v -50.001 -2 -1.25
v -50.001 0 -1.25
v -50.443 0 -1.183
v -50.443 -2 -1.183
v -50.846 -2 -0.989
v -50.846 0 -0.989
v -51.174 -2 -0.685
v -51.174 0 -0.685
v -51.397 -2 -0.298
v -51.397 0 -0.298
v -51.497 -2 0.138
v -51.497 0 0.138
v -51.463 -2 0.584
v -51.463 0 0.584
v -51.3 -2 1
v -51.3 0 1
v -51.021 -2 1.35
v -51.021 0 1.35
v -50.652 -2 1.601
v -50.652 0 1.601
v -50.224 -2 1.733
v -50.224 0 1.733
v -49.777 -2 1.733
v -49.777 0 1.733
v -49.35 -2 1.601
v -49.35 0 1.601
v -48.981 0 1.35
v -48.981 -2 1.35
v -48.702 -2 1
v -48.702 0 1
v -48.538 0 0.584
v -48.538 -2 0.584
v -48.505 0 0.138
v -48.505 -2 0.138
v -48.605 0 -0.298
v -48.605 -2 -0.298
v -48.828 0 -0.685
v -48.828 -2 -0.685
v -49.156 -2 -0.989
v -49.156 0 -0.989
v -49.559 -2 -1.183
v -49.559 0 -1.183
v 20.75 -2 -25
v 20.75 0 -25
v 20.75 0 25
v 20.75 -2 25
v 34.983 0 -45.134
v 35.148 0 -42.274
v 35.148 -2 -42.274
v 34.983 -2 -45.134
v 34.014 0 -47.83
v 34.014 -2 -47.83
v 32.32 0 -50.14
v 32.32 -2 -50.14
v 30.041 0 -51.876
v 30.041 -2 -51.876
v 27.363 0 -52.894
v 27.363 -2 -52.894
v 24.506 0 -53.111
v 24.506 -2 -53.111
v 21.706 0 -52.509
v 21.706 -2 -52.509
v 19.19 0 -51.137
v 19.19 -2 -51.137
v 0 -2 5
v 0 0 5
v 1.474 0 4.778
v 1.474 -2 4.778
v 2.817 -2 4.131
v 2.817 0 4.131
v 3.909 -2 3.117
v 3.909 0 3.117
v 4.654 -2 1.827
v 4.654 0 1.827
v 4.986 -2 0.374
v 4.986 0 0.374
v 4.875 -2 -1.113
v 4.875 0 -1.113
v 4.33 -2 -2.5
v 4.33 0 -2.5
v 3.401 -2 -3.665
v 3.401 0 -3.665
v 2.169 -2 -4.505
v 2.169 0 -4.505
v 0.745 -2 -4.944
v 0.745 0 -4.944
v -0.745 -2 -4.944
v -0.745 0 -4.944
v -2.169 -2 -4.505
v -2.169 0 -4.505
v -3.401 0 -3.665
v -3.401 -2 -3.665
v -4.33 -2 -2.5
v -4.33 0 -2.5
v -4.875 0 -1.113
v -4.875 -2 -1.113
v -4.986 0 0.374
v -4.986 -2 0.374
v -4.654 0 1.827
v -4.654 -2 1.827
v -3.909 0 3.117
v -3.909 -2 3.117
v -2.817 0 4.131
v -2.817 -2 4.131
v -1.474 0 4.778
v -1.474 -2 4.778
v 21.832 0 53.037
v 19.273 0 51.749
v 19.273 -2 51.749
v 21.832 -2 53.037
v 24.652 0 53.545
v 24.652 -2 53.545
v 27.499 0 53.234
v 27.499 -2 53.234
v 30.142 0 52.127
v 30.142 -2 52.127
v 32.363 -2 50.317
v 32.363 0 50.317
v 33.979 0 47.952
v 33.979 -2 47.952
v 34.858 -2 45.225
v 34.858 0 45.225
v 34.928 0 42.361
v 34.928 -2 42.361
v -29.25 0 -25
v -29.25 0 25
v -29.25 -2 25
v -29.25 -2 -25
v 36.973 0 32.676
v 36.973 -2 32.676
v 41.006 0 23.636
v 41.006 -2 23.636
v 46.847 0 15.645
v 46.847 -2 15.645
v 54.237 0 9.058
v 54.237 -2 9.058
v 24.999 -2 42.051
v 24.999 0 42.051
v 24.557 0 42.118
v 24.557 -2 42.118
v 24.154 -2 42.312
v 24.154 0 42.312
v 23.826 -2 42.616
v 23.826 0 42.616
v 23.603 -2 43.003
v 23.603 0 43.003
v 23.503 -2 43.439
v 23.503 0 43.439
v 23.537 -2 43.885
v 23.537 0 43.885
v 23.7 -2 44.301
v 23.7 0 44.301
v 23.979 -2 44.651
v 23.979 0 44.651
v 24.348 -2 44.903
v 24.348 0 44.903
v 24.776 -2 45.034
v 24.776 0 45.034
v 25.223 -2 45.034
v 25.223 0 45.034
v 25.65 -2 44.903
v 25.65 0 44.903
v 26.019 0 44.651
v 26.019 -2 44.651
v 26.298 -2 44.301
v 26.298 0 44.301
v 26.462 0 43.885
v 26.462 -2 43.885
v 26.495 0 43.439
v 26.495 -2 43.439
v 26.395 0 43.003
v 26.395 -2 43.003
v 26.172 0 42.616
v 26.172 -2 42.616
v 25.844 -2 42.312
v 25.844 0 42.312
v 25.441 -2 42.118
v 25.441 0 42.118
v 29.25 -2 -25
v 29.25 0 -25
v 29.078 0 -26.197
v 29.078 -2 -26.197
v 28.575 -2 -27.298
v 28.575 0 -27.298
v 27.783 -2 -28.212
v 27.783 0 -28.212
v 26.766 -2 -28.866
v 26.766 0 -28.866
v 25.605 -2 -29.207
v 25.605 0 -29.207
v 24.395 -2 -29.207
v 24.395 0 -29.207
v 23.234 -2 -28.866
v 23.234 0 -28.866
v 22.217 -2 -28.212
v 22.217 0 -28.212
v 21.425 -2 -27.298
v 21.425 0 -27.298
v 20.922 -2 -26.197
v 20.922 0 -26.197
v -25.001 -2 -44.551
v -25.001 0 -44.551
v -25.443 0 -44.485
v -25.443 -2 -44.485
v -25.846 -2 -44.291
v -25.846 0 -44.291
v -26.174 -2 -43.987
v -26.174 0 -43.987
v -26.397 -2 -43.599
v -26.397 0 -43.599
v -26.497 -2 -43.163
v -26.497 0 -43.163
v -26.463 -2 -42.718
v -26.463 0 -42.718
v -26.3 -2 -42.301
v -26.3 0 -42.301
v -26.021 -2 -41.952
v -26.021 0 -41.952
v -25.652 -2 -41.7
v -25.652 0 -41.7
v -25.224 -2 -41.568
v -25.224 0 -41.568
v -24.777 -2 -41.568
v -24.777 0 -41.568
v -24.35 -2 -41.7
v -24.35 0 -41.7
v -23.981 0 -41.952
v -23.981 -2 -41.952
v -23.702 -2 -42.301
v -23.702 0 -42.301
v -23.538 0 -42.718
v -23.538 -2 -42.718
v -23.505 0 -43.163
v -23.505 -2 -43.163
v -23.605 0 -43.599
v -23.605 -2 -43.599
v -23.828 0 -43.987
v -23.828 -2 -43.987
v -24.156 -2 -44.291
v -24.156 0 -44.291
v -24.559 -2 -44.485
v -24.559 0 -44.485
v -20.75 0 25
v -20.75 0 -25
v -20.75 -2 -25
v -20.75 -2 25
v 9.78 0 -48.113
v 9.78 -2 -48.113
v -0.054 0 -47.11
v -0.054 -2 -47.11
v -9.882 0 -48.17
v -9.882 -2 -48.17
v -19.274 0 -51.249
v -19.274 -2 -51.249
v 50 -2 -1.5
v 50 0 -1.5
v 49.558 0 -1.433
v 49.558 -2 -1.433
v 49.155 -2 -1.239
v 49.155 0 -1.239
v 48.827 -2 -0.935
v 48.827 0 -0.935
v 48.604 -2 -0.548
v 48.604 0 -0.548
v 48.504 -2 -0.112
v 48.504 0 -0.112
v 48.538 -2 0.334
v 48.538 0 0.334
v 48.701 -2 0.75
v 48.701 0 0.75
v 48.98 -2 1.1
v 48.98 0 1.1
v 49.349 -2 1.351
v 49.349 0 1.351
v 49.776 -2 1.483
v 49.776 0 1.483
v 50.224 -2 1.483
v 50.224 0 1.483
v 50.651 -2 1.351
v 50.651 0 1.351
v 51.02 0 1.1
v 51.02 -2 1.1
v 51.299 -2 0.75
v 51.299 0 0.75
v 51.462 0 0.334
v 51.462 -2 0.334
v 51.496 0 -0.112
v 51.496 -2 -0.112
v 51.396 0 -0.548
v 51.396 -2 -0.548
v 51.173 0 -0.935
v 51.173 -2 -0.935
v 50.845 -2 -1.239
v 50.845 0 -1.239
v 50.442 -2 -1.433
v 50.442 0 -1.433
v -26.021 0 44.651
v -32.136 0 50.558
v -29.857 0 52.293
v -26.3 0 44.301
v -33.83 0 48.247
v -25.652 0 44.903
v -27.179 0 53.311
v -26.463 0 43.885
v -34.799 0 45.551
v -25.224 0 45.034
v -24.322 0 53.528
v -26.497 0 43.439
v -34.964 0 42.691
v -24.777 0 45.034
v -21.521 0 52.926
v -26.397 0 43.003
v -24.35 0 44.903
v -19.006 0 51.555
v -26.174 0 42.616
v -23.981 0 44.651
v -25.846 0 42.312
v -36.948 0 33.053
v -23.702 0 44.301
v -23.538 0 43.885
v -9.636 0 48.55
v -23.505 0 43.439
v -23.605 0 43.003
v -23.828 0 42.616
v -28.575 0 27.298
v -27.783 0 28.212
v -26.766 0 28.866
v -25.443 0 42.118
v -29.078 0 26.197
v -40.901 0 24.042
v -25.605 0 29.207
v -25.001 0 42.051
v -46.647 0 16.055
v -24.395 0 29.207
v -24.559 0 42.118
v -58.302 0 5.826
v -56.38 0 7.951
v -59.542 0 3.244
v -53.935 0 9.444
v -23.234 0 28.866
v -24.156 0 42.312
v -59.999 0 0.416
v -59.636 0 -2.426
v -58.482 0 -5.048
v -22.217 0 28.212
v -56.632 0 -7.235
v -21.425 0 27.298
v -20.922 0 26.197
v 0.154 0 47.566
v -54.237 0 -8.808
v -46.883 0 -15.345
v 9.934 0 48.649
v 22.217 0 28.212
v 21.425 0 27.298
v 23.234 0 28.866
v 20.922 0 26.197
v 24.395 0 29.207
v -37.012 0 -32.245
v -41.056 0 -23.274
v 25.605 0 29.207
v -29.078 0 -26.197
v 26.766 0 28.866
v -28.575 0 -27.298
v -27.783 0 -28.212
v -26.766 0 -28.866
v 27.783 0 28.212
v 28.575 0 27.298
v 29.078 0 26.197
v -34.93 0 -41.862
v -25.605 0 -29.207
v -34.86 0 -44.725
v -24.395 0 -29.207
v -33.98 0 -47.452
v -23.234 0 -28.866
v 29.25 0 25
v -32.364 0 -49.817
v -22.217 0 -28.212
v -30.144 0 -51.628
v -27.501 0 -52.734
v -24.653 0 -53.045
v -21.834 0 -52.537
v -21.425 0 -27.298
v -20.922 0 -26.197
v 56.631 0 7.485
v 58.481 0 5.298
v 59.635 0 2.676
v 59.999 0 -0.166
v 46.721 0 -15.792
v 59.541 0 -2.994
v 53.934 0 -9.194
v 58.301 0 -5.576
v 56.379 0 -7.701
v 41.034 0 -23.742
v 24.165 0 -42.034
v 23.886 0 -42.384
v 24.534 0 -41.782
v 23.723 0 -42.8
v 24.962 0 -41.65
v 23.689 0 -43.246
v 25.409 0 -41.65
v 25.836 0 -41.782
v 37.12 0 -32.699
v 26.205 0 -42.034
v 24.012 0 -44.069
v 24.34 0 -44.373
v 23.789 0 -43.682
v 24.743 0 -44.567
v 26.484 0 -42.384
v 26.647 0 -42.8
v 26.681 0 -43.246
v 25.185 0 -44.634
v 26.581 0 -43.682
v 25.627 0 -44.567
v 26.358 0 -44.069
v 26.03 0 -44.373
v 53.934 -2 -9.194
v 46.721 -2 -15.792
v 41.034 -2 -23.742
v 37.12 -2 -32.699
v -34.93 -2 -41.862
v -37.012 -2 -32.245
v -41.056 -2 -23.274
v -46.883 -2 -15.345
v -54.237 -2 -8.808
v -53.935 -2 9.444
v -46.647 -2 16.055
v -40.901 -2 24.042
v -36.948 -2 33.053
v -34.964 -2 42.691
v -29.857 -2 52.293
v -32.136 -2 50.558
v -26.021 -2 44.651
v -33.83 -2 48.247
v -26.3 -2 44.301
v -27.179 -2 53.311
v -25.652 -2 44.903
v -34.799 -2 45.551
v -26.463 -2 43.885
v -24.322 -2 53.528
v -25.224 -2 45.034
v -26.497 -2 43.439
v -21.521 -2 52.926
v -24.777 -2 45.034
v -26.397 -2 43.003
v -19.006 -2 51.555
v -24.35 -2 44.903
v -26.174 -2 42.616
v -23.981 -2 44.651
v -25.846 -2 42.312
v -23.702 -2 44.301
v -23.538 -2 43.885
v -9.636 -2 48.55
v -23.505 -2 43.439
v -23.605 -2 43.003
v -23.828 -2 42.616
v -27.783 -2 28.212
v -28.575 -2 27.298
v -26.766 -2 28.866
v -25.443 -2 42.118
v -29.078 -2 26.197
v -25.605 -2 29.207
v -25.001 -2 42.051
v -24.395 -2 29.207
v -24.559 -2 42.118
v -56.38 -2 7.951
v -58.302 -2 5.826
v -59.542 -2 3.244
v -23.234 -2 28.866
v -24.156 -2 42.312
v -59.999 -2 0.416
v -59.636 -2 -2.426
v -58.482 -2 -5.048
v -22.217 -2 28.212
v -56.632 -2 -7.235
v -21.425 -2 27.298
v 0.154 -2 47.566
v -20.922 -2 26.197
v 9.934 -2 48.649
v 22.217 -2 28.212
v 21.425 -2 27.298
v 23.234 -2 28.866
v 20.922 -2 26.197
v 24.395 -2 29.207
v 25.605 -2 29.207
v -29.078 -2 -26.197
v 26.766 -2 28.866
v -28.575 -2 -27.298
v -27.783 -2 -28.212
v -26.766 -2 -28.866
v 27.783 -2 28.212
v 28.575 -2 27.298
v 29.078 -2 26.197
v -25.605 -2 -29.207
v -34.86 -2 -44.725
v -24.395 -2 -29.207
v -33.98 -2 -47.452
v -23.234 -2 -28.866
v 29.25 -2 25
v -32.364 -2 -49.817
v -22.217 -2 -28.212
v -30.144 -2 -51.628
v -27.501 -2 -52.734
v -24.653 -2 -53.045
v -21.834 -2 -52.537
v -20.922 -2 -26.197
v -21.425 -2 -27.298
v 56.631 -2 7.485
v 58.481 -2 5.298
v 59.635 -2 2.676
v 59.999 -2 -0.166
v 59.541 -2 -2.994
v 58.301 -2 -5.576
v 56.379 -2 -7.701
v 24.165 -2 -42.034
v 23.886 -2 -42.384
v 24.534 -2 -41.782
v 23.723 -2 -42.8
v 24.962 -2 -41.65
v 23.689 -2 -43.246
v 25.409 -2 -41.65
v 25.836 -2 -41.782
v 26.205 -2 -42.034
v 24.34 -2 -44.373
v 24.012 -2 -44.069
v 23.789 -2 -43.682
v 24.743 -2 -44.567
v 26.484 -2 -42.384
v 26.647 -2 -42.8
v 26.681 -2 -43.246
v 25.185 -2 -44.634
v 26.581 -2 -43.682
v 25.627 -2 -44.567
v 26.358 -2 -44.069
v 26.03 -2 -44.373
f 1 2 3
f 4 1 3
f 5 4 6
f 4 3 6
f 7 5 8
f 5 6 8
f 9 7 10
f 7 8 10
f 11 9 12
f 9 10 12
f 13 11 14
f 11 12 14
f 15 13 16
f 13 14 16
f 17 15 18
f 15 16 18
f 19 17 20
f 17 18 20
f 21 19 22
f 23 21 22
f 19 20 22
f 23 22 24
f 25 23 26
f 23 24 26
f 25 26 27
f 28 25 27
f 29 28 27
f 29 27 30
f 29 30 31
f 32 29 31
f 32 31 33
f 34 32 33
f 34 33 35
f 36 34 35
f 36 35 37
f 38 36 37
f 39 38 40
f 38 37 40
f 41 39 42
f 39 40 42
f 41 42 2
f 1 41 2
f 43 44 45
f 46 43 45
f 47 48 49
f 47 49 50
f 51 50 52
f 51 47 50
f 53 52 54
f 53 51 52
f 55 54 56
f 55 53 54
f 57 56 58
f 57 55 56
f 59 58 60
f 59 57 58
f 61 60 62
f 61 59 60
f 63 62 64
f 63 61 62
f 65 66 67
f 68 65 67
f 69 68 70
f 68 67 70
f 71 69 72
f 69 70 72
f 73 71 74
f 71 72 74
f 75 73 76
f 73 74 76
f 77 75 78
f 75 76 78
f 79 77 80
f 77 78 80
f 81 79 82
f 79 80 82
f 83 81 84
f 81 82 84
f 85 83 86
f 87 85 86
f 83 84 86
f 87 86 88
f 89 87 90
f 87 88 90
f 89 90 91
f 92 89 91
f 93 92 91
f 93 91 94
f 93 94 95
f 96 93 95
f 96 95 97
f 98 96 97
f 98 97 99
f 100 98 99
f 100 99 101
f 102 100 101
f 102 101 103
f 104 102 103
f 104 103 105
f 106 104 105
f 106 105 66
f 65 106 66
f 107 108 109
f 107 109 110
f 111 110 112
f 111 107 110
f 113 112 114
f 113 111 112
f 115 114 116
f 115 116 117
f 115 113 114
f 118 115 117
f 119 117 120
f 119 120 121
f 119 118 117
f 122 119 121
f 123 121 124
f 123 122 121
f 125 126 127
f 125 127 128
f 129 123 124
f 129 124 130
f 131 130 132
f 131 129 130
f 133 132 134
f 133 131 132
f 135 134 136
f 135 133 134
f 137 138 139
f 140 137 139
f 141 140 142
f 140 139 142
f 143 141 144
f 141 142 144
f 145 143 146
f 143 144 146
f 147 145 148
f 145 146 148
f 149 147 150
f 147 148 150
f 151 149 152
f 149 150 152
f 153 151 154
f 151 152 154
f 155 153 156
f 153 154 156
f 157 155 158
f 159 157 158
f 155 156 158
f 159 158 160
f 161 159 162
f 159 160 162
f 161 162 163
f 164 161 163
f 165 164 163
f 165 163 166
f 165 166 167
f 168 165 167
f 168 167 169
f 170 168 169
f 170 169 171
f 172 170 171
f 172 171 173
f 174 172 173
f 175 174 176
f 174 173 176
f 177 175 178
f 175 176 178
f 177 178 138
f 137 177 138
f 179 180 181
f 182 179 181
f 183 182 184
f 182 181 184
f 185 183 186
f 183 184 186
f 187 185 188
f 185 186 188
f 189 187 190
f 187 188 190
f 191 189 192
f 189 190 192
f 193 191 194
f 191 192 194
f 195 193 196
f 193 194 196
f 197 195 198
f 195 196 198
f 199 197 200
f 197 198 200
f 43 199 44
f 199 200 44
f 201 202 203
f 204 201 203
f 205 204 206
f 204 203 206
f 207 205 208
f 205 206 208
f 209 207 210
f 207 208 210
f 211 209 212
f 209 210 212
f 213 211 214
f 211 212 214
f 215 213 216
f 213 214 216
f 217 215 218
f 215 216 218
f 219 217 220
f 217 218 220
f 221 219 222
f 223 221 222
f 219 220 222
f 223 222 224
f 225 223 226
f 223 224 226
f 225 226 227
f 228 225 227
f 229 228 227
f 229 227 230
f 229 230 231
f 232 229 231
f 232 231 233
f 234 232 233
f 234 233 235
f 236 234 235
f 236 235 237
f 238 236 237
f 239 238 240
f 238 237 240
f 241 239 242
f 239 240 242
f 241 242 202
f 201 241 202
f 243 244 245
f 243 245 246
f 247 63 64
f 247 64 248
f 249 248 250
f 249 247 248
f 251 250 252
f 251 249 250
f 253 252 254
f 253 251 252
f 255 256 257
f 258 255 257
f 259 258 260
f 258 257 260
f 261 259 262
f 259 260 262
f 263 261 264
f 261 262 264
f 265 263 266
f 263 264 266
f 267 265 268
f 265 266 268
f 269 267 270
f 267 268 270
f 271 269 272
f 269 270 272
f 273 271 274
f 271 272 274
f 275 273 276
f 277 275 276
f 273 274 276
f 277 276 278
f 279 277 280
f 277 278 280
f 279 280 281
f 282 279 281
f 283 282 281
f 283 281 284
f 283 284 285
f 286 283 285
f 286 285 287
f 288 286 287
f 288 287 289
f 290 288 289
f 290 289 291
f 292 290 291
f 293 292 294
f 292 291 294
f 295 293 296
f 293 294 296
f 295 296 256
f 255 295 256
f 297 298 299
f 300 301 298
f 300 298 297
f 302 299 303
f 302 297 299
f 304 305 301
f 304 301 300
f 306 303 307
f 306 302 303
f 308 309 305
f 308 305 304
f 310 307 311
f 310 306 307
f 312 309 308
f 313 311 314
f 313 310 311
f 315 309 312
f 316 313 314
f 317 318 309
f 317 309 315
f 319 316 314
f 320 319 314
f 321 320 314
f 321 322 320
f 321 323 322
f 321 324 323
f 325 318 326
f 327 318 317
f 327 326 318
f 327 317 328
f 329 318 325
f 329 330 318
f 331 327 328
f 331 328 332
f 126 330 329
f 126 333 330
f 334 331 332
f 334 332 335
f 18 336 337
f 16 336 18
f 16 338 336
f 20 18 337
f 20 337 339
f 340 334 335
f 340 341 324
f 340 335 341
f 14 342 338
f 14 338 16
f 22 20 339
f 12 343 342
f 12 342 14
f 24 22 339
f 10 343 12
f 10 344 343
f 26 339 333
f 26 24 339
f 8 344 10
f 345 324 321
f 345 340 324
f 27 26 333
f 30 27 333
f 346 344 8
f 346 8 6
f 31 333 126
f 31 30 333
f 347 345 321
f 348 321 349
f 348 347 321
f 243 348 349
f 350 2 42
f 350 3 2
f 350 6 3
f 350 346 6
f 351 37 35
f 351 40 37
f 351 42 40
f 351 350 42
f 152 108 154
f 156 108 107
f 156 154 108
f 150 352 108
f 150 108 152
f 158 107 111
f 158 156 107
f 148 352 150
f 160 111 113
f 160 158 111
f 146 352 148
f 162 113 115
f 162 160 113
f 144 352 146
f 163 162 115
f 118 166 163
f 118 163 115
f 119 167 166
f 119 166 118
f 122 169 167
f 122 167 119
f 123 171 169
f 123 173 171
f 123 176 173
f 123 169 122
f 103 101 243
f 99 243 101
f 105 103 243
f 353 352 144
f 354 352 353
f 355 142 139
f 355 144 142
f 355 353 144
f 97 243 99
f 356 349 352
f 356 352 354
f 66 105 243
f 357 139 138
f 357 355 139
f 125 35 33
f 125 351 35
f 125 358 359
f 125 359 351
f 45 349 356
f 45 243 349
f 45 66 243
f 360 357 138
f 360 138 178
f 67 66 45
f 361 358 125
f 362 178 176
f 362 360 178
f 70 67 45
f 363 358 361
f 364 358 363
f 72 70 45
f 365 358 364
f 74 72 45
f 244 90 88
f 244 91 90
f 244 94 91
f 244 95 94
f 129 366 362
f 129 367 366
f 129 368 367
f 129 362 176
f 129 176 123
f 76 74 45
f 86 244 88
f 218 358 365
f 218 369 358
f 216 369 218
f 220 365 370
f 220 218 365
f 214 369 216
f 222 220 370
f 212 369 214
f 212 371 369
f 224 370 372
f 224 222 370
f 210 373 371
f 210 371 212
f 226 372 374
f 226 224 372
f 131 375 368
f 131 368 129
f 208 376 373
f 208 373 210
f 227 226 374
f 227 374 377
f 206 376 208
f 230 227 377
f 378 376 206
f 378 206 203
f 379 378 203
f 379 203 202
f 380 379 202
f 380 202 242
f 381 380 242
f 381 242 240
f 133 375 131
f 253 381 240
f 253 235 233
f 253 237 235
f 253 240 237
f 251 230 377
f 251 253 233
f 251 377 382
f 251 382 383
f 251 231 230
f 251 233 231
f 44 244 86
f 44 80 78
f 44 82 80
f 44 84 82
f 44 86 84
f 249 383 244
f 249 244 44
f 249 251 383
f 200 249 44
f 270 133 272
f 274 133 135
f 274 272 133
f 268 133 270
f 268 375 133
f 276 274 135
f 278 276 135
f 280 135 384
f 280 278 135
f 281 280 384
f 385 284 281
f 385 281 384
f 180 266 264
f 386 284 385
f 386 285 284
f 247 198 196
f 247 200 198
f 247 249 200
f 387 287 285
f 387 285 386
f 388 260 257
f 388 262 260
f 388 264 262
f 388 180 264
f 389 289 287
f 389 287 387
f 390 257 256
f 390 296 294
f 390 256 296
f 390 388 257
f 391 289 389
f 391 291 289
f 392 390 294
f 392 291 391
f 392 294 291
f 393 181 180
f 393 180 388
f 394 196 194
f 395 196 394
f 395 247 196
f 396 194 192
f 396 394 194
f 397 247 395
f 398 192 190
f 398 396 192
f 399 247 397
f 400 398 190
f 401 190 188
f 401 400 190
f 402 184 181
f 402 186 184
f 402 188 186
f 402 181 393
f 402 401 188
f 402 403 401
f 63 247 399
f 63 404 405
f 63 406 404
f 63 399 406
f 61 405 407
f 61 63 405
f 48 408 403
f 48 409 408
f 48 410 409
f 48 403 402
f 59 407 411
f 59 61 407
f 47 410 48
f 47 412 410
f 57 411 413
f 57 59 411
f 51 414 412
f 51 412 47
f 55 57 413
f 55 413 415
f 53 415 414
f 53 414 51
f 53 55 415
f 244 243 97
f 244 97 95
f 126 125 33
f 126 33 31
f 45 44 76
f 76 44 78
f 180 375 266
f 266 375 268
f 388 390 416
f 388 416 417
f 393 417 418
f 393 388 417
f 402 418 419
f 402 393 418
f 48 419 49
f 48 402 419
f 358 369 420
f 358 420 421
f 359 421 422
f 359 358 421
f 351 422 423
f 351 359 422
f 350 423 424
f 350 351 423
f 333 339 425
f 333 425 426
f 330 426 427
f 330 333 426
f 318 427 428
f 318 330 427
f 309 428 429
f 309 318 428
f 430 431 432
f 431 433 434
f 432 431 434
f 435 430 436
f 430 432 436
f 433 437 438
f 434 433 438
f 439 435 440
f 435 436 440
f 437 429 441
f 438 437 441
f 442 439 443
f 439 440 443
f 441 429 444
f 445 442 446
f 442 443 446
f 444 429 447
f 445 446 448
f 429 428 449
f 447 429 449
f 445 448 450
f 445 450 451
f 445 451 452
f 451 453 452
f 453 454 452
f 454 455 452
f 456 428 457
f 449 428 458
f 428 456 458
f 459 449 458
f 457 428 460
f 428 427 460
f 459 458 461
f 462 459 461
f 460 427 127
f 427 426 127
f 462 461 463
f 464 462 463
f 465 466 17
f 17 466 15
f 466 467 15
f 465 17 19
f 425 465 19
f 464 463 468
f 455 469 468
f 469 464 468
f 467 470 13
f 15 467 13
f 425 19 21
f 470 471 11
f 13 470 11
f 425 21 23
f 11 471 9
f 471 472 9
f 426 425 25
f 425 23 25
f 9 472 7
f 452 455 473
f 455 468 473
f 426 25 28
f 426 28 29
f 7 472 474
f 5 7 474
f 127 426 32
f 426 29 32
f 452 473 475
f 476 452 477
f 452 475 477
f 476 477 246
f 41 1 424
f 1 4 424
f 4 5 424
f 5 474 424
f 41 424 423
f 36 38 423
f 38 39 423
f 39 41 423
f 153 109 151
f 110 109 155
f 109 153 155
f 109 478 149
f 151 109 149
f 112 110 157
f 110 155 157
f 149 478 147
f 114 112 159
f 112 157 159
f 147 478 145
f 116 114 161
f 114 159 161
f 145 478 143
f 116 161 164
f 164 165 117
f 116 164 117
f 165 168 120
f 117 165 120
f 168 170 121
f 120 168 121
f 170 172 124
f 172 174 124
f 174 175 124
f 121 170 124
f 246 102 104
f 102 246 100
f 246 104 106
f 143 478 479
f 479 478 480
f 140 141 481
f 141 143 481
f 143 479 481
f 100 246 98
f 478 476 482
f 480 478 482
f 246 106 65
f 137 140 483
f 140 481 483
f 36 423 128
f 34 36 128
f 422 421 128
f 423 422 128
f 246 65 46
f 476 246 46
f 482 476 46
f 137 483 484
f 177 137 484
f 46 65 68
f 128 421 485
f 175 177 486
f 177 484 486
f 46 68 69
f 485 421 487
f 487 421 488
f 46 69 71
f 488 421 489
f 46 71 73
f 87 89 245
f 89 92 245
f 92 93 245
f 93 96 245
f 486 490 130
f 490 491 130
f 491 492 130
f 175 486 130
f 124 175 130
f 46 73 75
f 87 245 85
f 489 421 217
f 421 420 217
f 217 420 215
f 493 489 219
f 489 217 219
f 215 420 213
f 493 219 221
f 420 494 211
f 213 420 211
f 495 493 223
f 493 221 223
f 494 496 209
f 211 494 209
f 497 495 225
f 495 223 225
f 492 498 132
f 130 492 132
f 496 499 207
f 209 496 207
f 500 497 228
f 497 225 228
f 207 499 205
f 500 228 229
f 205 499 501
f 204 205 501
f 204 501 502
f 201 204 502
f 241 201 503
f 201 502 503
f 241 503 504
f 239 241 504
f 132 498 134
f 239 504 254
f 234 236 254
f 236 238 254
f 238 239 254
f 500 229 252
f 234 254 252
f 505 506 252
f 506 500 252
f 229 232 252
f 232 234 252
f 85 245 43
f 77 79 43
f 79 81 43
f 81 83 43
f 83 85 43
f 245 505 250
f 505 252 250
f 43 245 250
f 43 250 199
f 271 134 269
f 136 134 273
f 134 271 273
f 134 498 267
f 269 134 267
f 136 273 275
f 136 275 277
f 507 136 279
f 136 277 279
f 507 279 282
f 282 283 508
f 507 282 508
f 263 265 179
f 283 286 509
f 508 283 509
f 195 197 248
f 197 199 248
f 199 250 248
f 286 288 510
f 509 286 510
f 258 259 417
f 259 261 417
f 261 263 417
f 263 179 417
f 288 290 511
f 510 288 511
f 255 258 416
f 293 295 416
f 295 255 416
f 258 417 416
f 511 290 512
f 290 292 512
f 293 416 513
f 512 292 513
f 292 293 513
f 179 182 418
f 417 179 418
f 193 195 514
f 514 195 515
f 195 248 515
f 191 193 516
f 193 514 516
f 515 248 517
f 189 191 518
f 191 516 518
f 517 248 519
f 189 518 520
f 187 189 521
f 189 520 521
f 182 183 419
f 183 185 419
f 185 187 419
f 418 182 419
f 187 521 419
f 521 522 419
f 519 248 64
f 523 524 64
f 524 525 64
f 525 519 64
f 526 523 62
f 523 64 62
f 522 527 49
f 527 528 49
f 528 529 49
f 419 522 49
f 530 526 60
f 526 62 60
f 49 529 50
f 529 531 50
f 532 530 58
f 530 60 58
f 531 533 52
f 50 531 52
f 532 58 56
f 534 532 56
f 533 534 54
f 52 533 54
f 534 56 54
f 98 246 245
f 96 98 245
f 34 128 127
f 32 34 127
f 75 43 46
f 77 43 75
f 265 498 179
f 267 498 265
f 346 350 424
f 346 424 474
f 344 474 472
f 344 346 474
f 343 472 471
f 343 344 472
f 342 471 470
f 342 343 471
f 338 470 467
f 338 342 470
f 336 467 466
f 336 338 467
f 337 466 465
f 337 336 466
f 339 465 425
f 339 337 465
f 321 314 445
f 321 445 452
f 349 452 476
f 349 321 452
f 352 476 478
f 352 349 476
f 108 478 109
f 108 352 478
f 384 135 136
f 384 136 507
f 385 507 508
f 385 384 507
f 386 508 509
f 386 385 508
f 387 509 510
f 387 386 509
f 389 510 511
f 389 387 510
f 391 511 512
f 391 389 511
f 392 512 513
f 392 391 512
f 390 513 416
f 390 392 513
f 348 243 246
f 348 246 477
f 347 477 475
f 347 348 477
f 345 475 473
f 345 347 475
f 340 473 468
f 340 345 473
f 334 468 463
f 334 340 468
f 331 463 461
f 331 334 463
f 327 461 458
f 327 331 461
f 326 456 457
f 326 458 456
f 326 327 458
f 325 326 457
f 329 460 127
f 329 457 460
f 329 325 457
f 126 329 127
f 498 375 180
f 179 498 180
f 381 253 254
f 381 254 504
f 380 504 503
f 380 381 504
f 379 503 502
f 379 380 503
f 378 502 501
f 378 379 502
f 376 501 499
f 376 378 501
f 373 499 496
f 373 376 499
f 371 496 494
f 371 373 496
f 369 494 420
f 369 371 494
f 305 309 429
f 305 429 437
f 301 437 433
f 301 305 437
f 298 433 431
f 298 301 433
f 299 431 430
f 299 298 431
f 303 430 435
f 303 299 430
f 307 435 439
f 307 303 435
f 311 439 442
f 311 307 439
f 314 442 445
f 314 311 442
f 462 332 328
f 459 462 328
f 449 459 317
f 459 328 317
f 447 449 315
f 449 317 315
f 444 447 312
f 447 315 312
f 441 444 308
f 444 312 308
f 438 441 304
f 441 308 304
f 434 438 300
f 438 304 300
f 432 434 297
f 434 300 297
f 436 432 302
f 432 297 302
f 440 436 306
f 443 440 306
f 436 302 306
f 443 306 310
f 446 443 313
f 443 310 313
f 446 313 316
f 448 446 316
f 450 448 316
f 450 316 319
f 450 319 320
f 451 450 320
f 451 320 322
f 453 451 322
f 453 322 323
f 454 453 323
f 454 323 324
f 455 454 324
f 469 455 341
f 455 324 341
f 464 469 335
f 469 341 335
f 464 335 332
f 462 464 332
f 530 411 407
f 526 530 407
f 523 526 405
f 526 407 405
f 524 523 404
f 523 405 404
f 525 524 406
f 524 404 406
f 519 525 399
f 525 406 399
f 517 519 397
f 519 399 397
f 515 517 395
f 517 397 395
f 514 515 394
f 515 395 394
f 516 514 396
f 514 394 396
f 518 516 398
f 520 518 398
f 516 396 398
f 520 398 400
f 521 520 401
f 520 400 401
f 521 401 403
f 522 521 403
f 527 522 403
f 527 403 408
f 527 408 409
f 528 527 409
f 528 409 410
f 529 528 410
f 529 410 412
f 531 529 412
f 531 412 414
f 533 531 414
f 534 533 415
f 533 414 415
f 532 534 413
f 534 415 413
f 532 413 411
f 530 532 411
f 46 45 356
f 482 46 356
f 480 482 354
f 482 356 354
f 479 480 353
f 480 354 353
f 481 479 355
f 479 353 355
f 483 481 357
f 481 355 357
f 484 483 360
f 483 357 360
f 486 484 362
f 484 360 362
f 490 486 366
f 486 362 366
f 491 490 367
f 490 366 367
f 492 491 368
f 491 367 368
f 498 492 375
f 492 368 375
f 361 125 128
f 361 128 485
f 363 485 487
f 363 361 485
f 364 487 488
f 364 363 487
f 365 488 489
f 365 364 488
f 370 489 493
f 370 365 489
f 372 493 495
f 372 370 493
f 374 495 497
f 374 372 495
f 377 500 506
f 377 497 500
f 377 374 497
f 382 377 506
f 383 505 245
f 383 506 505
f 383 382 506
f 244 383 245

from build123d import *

# Parameters (mm, degrees)
SKETCH1_R           = 1.5
BOSS_EXTRUDE1_DEPTH = 2
CUT_EXTRUDE1_DEPTH  = 81.447719073
SKETCH3_R           = 5
CUT_EXTRUDE2_DEPTH  = 81.447719073


with BuildPart() as part:
    # Sketch1 → Boss-Extrude1 (new body)
    with BuildSketch(Plane(origin=(0, 0, 0), x_dir=(1, 0, 0), z_dir=(0, 1, 0))):
        with BuildLine():
            ThreePointArc((-34.963763955, -42.691134729), (-29.856641946, -52.293165337), (-19.005975188, -51.555115262))
            ThreePointArc((-19.005975188, -51.555115262), (0.154155805, -47.566469585), (19.272821809, -51.749354259))
            ThreePointArc((19.272821809, -51.749354259), (30.141985248, -52.127472163), (34.928148513, -42.361494065))
            ThreePointArc((34.928148513, -42.361494065), (41.005634123, -23.636153056), (54.236585765, -9.05821953))
            ThreePointArc((54.236585765, -9.05821953), (59.998627194, 0.165693174), (53.934123701, 9.193621197))
            ThreePointArc((53.934123701, 9.193621197), (41.034184142, 23.742001216), (35.148040543, 42.273518027))
            ThreePointArc((35.148040543, 42.273518027), (30.040918534, 51.875548635), (19.190251776, 51.13749856))
            ThreePointArc((19.190251776, 51.13749856), (-0.053987233, 47.109599988), (-19.274467503, 51.249387444))
            ThreePointArc((-19.274467503, 51.249387444), (-30.143630941, 51.627505348), (-34.929794206, 41.86152725))
            ThreePointArc((-34.929794206, 41.86152725), (-41.05559122, 23.274044232), (-54.237408611, 8.808236123))
            ThreePointArc((-54.237408611, 8.808236123), (-59.999450041, -0.415676581), (-53.934946548, -9.443604604))
            ThreePointArc((-53.934946548, -9.443604604), (-40.900612569, -24.042441945), (-34.963763955, -42.691134729))
        make_face()
        with Locations(Location((50, 0, 0), (0, 0, 90))):
            Circle(SKETCH1_R, mode=Mode.SUBTRACT)
        with Locations(Location((24.999177153, -43.551253597, 0), (0, 0, 90))):
            Circle(SKETCH1_R, mode=Mode.SUBTRACT)
        with Locations(Location((25.185099435, 43.133636895, 0), (0, 0, 90))):
            Circle(SKETCH1_R, mode=Mode.SUBTRACT)
        with Locations(Location((-25.000822847, -43.551253597, 0), (0, 0, 90))):
            Circle(SKETCH1_R, mode=Mode.SUBTRACT)
        with Locations(Location((-50.000822847, -0.249983407, 0), (0, 0, 90))):
            Circle(SKETCH1_R, mode=Mode.SUBTRACT)
        with Locations(Location((-25.000822847, 43.051286782, 0), (0, 0, 90))):
            Circle(SKETCH1_R, mode=Mode.SUBTRACT)
    extrude(amount=-BOSS_EXTRUDE1_DEPTH)

    # Sketch2 → Cut-Extrude1 (cut, through all)
    with BuildSketch(Plane(origin=(0, 0, 0), x_dir=(1, 0, 0), z_dir=(0, 1, 0))):
        with BuildLine():
            Line((-20.75, 25), (-20.75, -25))
            ThreePointArc((-20.75, -25), (-25, -29.25), (-29.25, -25))
            Line((-29.25, -25), (-29.25, 25))
            ThreePointArc((-29.25, 25), (-25, 29.25), (-20.75, 25))
        make_face()
        with BuildLine():
            Line((20.75, 25), (20.75, -25))
            ThreePointArc((20.75, -25), (25, -29.25), (29.25, -25))
            Line((29.25, -25), (29.25, 25))
            ThreePointArc((29.25, 25), (25, 29.25), (20.75, 25))
        make_face()
    extrude(amount=-CUT_EXTRUDE1_DEPTH, mode=Mode.SUBTRACT)

    # Sketch3 → Cut-Extrude2 (cut, through all)
    with BuildSketch(Plane(origin=(0, 0, 0), x_dir=(1, 0, 0), z_dir=(0, 1, 0))):
        with Locations(Location((0, 0, 0), (0, 0, 270))):
            Circle(SKETCH3_R)
    extrude(amount=-CUT_EXTRUDE2_DEPTH, mode=Mode.SUBTRACT)


solid = part.part
